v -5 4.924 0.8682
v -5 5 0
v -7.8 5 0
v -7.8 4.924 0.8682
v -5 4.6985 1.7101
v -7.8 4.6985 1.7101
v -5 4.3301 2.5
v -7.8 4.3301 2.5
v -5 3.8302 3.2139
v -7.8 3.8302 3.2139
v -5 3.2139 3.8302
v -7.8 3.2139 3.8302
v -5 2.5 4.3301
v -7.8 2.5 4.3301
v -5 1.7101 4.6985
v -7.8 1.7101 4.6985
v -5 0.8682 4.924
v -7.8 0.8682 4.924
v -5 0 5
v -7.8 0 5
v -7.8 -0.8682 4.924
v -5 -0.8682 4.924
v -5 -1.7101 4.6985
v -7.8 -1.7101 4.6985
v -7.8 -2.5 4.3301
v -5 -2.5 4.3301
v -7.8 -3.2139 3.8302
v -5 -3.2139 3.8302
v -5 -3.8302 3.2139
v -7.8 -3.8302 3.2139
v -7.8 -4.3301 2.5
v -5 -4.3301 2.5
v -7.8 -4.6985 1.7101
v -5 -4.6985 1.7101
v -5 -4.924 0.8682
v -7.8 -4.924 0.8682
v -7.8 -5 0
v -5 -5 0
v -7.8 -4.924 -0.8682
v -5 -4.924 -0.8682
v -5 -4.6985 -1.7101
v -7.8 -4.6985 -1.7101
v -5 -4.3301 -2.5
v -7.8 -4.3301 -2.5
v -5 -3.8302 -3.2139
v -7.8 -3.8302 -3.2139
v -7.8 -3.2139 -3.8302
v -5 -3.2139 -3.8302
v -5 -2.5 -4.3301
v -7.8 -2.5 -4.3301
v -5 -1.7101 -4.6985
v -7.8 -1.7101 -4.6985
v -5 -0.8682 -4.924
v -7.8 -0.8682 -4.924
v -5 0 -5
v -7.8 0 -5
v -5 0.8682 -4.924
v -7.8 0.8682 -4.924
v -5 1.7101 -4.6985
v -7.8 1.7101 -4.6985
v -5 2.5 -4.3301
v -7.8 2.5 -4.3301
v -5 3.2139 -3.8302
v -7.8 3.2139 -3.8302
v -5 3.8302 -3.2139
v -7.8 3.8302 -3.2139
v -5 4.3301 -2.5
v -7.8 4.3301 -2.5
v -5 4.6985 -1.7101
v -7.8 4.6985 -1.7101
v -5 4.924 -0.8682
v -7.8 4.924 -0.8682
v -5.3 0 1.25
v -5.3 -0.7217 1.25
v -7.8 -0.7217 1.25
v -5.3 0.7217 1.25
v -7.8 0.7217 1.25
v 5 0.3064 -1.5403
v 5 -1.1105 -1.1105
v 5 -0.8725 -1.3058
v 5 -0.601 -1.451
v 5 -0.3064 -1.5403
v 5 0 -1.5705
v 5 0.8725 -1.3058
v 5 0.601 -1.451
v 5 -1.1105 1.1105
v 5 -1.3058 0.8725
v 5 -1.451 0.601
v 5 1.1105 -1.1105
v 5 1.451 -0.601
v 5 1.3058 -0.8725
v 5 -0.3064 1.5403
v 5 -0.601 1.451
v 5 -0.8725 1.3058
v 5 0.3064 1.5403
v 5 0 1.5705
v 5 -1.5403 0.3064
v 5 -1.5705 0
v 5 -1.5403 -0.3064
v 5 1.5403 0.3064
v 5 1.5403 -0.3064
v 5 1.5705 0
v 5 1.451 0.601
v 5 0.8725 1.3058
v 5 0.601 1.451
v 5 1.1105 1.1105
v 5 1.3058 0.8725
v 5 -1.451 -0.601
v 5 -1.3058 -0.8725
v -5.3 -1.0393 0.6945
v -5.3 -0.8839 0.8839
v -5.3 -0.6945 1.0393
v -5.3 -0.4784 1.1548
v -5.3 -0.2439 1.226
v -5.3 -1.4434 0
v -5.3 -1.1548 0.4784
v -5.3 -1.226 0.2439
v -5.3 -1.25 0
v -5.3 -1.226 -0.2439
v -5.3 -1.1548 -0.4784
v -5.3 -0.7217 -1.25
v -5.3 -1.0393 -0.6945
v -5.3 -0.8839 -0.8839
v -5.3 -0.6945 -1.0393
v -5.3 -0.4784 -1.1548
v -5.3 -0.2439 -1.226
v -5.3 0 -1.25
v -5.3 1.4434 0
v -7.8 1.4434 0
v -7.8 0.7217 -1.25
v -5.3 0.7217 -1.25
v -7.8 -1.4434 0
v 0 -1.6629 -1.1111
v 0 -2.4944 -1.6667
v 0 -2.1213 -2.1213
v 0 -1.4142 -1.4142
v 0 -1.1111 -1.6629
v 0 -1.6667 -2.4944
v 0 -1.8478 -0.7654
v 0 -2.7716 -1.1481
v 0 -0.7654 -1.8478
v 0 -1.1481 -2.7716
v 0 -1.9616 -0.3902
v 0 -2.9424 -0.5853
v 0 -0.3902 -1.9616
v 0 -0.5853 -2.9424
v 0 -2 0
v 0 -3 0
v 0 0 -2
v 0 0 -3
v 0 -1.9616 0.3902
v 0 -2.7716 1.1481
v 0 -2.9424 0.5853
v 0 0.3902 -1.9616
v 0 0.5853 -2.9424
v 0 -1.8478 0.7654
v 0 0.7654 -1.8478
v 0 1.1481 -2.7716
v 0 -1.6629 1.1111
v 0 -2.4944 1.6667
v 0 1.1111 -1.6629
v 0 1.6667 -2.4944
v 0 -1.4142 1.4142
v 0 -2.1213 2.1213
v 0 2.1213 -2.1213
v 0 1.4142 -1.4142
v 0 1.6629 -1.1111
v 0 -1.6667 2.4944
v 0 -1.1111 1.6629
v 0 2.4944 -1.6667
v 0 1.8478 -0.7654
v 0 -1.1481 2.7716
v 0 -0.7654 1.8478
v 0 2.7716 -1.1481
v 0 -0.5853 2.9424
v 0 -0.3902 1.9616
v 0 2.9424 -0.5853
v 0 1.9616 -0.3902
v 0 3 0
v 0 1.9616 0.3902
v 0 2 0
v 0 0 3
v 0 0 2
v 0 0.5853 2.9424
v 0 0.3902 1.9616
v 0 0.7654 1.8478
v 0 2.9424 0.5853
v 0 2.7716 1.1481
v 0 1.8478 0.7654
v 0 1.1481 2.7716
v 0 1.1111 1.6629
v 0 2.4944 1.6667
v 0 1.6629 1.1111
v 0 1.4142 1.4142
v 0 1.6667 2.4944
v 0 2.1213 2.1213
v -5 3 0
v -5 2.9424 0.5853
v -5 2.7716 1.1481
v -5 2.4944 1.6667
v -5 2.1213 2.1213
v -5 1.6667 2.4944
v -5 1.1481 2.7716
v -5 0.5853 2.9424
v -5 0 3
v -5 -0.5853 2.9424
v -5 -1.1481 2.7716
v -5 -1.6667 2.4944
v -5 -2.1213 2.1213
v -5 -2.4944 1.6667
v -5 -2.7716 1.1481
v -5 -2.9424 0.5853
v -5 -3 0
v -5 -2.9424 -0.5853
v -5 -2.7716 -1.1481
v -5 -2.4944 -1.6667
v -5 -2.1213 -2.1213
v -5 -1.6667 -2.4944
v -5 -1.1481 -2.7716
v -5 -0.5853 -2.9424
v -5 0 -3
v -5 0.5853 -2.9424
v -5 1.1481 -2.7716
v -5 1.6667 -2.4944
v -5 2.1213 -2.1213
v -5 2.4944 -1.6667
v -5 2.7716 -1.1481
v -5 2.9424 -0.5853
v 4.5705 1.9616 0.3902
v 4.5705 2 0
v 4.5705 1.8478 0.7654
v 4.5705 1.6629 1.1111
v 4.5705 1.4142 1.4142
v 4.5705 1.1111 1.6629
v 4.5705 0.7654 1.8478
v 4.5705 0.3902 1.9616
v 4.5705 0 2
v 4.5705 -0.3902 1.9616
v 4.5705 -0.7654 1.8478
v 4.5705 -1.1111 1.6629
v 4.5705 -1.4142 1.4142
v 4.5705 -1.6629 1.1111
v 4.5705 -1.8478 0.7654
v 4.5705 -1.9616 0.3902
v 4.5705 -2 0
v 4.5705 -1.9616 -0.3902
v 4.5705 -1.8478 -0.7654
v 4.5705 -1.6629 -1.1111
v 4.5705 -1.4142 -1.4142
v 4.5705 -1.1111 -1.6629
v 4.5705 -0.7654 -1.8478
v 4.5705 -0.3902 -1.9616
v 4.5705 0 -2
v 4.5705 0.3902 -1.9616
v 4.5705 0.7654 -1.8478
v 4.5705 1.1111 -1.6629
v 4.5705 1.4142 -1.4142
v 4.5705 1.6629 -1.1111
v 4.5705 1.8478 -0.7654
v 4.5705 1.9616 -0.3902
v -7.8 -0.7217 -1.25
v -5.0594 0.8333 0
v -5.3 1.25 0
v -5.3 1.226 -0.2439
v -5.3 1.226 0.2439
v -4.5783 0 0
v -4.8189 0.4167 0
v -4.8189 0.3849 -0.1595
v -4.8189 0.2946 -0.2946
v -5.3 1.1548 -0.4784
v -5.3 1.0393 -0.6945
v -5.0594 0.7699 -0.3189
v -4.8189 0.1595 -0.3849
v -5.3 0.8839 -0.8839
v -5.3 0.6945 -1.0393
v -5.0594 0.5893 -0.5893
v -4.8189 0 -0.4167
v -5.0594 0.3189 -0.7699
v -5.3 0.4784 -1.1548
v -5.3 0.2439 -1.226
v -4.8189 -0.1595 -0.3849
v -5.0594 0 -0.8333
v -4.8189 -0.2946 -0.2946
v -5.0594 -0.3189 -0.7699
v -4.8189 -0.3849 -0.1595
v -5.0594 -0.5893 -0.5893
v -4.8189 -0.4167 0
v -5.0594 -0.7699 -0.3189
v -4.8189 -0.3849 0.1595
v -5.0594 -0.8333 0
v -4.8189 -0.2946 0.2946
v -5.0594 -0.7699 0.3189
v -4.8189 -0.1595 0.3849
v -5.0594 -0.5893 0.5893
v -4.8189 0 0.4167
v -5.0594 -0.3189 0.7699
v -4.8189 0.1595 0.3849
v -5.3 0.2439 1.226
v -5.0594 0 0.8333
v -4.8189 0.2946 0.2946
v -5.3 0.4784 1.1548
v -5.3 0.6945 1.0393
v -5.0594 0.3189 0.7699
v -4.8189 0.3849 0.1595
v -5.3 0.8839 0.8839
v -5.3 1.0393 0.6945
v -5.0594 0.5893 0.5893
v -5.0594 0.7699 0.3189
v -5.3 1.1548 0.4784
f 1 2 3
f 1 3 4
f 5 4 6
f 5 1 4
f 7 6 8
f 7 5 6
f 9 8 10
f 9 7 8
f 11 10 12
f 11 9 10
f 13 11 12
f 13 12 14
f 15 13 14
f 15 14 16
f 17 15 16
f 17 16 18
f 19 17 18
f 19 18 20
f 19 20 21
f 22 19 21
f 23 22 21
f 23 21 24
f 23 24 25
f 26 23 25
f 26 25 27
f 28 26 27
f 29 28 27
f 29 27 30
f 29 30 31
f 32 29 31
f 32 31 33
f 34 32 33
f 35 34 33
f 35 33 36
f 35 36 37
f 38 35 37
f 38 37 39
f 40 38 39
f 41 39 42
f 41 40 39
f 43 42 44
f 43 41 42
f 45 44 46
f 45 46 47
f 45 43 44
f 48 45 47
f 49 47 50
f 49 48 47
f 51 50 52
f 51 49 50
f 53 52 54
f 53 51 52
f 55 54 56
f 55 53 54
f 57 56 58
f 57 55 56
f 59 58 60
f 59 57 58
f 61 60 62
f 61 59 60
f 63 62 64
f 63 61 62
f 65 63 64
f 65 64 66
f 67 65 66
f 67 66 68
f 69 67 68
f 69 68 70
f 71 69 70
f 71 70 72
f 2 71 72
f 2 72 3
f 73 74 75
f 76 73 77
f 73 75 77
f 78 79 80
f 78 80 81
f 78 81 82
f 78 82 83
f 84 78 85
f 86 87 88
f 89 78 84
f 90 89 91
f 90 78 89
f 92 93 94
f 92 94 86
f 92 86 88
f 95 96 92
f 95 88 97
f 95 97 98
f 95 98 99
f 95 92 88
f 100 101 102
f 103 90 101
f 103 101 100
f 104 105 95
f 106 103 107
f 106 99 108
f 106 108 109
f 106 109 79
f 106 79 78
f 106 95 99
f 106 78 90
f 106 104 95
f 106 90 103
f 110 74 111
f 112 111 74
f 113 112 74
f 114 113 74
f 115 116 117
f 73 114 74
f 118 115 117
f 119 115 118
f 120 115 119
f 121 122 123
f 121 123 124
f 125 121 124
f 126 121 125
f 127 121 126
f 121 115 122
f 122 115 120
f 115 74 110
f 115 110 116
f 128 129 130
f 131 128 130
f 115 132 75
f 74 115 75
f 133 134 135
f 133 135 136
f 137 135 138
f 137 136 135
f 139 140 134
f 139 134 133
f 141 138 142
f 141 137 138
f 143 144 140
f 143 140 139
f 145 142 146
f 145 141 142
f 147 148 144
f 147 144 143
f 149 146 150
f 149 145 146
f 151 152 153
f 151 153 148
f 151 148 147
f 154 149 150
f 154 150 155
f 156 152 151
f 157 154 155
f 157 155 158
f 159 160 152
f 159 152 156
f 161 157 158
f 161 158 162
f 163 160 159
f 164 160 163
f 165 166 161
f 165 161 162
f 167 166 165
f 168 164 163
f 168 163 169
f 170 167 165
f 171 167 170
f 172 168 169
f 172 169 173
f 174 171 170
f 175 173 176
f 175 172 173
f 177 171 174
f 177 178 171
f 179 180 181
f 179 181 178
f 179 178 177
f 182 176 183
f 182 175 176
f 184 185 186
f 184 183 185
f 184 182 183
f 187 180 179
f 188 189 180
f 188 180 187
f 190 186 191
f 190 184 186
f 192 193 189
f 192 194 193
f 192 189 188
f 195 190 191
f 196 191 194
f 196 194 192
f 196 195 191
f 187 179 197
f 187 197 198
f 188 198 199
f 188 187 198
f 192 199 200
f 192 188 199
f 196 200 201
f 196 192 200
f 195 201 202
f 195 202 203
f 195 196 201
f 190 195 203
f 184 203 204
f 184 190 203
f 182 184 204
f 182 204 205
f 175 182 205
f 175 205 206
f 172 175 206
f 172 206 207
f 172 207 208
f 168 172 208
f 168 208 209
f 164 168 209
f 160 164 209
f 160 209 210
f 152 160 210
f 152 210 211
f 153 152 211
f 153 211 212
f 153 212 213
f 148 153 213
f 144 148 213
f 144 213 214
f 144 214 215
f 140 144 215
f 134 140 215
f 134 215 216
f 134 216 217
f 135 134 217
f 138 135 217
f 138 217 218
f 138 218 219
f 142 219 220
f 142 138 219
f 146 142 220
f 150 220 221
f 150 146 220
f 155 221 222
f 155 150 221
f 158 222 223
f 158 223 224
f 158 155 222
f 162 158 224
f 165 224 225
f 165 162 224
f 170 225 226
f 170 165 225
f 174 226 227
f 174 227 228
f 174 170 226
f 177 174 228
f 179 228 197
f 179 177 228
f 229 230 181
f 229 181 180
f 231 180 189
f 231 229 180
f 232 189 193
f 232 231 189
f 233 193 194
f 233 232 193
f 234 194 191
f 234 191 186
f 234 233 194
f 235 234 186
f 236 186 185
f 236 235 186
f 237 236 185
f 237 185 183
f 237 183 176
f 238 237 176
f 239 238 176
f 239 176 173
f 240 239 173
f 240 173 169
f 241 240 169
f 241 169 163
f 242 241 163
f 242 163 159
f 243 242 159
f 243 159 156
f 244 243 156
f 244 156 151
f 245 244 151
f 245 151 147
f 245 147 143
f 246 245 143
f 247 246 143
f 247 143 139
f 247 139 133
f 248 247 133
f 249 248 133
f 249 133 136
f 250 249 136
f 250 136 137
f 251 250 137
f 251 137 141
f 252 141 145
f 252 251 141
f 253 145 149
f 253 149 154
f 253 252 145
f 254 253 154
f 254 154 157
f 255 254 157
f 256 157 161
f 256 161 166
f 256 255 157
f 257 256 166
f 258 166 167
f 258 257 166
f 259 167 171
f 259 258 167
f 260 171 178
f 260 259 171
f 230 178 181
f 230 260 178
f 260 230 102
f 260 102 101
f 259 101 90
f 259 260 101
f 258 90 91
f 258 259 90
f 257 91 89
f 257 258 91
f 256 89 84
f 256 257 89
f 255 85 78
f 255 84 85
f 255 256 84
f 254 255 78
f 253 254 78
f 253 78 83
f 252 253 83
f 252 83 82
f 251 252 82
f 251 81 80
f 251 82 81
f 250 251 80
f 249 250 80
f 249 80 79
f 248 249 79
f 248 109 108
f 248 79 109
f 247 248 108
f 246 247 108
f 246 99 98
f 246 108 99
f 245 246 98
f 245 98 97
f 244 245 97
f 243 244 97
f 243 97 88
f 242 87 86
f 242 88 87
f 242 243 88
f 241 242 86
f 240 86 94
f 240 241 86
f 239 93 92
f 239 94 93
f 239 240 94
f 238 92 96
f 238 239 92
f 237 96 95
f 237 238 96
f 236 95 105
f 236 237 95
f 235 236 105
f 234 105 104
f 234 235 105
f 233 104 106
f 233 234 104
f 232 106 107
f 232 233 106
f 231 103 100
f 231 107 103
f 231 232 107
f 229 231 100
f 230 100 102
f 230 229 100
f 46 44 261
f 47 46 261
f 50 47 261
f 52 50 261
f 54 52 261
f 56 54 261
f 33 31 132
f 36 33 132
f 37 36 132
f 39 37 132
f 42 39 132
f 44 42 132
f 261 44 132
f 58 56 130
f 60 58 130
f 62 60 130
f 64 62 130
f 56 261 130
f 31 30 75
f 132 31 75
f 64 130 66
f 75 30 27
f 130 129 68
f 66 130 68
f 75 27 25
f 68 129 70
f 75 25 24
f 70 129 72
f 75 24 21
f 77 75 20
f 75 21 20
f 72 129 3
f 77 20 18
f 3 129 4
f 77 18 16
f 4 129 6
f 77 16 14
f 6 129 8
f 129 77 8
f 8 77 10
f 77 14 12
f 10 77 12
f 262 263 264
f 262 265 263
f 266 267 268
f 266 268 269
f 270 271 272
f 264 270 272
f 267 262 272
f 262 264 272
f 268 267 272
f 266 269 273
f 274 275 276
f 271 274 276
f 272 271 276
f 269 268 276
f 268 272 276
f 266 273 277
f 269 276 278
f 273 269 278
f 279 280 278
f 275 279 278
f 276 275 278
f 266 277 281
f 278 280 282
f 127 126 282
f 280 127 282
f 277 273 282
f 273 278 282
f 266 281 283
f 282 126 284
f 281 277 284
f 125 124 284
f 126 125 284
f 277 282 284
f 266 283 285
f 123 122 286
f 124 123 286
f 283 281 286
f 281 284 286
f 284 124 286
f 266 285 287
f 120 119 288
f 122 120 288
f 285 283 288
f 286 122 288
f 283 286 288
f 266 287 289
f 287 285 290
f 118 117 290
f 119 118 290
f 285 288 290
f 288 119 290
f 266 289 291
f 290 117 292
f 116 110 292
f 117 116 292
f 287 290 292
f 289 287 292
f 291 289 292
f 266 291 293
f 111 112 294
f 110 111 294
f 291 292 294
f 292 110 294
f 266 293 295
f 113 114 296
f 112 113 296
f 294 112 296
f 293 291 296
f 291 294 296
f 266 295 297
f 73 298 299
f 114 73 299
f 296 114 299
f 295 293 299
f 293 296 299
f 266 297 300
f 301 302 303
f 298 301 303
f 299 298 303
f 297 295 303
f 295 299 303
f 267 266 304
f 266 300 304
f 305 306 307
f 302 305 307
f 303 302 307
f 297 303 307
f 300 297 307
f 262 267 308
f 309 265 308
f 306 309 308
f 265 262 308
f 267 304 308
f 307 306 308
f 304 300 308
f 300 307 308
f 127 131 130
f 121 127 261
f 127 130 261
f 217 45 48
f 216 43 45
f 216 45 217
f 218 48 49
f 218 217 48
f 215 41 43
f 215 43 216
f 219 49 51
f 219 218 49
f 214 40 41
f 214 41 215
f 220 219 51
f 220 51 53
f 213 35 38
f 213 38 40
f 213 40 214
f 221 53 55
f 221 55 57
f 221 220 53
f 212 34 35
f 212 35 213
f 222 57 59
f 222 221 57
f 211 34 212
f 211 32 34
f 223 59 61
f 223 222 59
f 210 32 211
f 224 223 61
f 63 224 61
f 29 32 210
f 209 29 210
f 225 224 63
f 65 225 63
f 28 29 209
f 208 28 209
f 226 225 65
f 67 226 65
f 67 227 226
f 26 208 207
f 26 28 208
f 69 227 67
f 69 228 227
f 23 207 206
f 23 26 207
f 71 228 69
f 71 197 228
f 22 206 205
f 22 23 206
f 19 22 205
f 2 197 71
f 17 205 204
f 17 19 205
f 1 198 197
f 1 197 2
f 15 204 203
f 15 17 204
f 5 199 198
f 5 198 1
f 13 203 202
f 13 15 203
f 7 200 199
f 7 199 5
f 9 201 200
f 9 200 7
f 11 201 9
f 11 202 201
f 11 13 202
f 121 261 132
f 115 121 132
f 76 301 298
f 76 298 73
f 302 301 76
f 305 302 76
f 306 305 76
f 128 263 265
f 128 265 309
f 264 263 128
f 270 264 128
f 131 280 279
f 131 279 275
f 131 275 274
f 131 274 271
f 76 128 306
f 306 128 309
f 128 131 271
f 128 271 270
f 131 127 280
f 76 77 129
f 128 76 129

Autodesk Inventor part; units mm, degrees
ref_plane "YZ Plane" through (0, 0, 0) normal (1, 0, 0) x (0, 1, 0)
ref_plane "XZ Plane" through (0, 0, 0) normal (0, 1, 0) x (-1, 0, 0)
ref_plane "XY Plane" through (0, 0, 0) normal (0, 0, 1) x (1, 0, 0)
sketch "Sketch_1" plane through (0, 0, 0) normal (0, 0, 1) x (1, 0, 0)
  line L0 (5, 0) -> (-7.8, 0)
  line L1 (-7.8, 0) -> (-7.8, 5)
  line L2 (-7.8, 5) -> (-5, 5)
  line L3 (-5, 5) -> (-5, 3)
  line L4 (-5, 3) -> (0, 3)
  line L5 (0, 3) -> (0, 2)
  line L6 (0, 2) -> (4.5705, 2)
  line L7 (4.5705, 2) -> (5, 1.5705)
  line L8 (5, 1.5705) -> (5, 0)
  line L9 (5, 0) -> (-7.8, 0)
revolve "Revolution1" add sketch "Sketch_1" angle 360 about axis through (5, 0, 0) along (1, 0, 0)
thread "Thread1" size "M4x0.7" class "6g" standard "ISO Metric profile" length 3.3705
sketch "Sketch_2" plane through (-7.8, 0, 0) normal (-1, 0, 0) x (0, 1, 0)
  line L0 (-1.4434, 0) -> (-0.7217, -1.25)
  line L1 (-0.7217, -1.25) -> (0.7217, -1.25)
  line L2 (0.7217, -1.25) -> (1.4434, 0)
  line L3 (1.4434, 0) -> (0.7217, 1.25)
  line L4 (0.7217, 1.25) -> (-0.7217, 1.25)
  line L5 (-0.7217, 1.25) -> (-1.4434, 0)
extrude "Extrusion1" cut sketch "Sketch_2" against normal blind 2.5
sketch "Sketch_3" plane through (0, 0, 0) normal (0, 0, 1) x (1, 0, 0)
  line L0 (-4.5783, 0) -> (-5.3, 0)
  line L1 (-5.3, 0) -> (-5.3, 1.25)
  line L2 (-5.3, 1.25) -> (-4.5783, 0)
  line L3 (-4.5783, 0) -> (-5.3, 0)
revolve "Revolution2" cut sketch "Sketch_3" angle 360 about axis through (-4.5783, 0, 0) along (1, 0, 0)
properties part number "DBS4-5-5"
